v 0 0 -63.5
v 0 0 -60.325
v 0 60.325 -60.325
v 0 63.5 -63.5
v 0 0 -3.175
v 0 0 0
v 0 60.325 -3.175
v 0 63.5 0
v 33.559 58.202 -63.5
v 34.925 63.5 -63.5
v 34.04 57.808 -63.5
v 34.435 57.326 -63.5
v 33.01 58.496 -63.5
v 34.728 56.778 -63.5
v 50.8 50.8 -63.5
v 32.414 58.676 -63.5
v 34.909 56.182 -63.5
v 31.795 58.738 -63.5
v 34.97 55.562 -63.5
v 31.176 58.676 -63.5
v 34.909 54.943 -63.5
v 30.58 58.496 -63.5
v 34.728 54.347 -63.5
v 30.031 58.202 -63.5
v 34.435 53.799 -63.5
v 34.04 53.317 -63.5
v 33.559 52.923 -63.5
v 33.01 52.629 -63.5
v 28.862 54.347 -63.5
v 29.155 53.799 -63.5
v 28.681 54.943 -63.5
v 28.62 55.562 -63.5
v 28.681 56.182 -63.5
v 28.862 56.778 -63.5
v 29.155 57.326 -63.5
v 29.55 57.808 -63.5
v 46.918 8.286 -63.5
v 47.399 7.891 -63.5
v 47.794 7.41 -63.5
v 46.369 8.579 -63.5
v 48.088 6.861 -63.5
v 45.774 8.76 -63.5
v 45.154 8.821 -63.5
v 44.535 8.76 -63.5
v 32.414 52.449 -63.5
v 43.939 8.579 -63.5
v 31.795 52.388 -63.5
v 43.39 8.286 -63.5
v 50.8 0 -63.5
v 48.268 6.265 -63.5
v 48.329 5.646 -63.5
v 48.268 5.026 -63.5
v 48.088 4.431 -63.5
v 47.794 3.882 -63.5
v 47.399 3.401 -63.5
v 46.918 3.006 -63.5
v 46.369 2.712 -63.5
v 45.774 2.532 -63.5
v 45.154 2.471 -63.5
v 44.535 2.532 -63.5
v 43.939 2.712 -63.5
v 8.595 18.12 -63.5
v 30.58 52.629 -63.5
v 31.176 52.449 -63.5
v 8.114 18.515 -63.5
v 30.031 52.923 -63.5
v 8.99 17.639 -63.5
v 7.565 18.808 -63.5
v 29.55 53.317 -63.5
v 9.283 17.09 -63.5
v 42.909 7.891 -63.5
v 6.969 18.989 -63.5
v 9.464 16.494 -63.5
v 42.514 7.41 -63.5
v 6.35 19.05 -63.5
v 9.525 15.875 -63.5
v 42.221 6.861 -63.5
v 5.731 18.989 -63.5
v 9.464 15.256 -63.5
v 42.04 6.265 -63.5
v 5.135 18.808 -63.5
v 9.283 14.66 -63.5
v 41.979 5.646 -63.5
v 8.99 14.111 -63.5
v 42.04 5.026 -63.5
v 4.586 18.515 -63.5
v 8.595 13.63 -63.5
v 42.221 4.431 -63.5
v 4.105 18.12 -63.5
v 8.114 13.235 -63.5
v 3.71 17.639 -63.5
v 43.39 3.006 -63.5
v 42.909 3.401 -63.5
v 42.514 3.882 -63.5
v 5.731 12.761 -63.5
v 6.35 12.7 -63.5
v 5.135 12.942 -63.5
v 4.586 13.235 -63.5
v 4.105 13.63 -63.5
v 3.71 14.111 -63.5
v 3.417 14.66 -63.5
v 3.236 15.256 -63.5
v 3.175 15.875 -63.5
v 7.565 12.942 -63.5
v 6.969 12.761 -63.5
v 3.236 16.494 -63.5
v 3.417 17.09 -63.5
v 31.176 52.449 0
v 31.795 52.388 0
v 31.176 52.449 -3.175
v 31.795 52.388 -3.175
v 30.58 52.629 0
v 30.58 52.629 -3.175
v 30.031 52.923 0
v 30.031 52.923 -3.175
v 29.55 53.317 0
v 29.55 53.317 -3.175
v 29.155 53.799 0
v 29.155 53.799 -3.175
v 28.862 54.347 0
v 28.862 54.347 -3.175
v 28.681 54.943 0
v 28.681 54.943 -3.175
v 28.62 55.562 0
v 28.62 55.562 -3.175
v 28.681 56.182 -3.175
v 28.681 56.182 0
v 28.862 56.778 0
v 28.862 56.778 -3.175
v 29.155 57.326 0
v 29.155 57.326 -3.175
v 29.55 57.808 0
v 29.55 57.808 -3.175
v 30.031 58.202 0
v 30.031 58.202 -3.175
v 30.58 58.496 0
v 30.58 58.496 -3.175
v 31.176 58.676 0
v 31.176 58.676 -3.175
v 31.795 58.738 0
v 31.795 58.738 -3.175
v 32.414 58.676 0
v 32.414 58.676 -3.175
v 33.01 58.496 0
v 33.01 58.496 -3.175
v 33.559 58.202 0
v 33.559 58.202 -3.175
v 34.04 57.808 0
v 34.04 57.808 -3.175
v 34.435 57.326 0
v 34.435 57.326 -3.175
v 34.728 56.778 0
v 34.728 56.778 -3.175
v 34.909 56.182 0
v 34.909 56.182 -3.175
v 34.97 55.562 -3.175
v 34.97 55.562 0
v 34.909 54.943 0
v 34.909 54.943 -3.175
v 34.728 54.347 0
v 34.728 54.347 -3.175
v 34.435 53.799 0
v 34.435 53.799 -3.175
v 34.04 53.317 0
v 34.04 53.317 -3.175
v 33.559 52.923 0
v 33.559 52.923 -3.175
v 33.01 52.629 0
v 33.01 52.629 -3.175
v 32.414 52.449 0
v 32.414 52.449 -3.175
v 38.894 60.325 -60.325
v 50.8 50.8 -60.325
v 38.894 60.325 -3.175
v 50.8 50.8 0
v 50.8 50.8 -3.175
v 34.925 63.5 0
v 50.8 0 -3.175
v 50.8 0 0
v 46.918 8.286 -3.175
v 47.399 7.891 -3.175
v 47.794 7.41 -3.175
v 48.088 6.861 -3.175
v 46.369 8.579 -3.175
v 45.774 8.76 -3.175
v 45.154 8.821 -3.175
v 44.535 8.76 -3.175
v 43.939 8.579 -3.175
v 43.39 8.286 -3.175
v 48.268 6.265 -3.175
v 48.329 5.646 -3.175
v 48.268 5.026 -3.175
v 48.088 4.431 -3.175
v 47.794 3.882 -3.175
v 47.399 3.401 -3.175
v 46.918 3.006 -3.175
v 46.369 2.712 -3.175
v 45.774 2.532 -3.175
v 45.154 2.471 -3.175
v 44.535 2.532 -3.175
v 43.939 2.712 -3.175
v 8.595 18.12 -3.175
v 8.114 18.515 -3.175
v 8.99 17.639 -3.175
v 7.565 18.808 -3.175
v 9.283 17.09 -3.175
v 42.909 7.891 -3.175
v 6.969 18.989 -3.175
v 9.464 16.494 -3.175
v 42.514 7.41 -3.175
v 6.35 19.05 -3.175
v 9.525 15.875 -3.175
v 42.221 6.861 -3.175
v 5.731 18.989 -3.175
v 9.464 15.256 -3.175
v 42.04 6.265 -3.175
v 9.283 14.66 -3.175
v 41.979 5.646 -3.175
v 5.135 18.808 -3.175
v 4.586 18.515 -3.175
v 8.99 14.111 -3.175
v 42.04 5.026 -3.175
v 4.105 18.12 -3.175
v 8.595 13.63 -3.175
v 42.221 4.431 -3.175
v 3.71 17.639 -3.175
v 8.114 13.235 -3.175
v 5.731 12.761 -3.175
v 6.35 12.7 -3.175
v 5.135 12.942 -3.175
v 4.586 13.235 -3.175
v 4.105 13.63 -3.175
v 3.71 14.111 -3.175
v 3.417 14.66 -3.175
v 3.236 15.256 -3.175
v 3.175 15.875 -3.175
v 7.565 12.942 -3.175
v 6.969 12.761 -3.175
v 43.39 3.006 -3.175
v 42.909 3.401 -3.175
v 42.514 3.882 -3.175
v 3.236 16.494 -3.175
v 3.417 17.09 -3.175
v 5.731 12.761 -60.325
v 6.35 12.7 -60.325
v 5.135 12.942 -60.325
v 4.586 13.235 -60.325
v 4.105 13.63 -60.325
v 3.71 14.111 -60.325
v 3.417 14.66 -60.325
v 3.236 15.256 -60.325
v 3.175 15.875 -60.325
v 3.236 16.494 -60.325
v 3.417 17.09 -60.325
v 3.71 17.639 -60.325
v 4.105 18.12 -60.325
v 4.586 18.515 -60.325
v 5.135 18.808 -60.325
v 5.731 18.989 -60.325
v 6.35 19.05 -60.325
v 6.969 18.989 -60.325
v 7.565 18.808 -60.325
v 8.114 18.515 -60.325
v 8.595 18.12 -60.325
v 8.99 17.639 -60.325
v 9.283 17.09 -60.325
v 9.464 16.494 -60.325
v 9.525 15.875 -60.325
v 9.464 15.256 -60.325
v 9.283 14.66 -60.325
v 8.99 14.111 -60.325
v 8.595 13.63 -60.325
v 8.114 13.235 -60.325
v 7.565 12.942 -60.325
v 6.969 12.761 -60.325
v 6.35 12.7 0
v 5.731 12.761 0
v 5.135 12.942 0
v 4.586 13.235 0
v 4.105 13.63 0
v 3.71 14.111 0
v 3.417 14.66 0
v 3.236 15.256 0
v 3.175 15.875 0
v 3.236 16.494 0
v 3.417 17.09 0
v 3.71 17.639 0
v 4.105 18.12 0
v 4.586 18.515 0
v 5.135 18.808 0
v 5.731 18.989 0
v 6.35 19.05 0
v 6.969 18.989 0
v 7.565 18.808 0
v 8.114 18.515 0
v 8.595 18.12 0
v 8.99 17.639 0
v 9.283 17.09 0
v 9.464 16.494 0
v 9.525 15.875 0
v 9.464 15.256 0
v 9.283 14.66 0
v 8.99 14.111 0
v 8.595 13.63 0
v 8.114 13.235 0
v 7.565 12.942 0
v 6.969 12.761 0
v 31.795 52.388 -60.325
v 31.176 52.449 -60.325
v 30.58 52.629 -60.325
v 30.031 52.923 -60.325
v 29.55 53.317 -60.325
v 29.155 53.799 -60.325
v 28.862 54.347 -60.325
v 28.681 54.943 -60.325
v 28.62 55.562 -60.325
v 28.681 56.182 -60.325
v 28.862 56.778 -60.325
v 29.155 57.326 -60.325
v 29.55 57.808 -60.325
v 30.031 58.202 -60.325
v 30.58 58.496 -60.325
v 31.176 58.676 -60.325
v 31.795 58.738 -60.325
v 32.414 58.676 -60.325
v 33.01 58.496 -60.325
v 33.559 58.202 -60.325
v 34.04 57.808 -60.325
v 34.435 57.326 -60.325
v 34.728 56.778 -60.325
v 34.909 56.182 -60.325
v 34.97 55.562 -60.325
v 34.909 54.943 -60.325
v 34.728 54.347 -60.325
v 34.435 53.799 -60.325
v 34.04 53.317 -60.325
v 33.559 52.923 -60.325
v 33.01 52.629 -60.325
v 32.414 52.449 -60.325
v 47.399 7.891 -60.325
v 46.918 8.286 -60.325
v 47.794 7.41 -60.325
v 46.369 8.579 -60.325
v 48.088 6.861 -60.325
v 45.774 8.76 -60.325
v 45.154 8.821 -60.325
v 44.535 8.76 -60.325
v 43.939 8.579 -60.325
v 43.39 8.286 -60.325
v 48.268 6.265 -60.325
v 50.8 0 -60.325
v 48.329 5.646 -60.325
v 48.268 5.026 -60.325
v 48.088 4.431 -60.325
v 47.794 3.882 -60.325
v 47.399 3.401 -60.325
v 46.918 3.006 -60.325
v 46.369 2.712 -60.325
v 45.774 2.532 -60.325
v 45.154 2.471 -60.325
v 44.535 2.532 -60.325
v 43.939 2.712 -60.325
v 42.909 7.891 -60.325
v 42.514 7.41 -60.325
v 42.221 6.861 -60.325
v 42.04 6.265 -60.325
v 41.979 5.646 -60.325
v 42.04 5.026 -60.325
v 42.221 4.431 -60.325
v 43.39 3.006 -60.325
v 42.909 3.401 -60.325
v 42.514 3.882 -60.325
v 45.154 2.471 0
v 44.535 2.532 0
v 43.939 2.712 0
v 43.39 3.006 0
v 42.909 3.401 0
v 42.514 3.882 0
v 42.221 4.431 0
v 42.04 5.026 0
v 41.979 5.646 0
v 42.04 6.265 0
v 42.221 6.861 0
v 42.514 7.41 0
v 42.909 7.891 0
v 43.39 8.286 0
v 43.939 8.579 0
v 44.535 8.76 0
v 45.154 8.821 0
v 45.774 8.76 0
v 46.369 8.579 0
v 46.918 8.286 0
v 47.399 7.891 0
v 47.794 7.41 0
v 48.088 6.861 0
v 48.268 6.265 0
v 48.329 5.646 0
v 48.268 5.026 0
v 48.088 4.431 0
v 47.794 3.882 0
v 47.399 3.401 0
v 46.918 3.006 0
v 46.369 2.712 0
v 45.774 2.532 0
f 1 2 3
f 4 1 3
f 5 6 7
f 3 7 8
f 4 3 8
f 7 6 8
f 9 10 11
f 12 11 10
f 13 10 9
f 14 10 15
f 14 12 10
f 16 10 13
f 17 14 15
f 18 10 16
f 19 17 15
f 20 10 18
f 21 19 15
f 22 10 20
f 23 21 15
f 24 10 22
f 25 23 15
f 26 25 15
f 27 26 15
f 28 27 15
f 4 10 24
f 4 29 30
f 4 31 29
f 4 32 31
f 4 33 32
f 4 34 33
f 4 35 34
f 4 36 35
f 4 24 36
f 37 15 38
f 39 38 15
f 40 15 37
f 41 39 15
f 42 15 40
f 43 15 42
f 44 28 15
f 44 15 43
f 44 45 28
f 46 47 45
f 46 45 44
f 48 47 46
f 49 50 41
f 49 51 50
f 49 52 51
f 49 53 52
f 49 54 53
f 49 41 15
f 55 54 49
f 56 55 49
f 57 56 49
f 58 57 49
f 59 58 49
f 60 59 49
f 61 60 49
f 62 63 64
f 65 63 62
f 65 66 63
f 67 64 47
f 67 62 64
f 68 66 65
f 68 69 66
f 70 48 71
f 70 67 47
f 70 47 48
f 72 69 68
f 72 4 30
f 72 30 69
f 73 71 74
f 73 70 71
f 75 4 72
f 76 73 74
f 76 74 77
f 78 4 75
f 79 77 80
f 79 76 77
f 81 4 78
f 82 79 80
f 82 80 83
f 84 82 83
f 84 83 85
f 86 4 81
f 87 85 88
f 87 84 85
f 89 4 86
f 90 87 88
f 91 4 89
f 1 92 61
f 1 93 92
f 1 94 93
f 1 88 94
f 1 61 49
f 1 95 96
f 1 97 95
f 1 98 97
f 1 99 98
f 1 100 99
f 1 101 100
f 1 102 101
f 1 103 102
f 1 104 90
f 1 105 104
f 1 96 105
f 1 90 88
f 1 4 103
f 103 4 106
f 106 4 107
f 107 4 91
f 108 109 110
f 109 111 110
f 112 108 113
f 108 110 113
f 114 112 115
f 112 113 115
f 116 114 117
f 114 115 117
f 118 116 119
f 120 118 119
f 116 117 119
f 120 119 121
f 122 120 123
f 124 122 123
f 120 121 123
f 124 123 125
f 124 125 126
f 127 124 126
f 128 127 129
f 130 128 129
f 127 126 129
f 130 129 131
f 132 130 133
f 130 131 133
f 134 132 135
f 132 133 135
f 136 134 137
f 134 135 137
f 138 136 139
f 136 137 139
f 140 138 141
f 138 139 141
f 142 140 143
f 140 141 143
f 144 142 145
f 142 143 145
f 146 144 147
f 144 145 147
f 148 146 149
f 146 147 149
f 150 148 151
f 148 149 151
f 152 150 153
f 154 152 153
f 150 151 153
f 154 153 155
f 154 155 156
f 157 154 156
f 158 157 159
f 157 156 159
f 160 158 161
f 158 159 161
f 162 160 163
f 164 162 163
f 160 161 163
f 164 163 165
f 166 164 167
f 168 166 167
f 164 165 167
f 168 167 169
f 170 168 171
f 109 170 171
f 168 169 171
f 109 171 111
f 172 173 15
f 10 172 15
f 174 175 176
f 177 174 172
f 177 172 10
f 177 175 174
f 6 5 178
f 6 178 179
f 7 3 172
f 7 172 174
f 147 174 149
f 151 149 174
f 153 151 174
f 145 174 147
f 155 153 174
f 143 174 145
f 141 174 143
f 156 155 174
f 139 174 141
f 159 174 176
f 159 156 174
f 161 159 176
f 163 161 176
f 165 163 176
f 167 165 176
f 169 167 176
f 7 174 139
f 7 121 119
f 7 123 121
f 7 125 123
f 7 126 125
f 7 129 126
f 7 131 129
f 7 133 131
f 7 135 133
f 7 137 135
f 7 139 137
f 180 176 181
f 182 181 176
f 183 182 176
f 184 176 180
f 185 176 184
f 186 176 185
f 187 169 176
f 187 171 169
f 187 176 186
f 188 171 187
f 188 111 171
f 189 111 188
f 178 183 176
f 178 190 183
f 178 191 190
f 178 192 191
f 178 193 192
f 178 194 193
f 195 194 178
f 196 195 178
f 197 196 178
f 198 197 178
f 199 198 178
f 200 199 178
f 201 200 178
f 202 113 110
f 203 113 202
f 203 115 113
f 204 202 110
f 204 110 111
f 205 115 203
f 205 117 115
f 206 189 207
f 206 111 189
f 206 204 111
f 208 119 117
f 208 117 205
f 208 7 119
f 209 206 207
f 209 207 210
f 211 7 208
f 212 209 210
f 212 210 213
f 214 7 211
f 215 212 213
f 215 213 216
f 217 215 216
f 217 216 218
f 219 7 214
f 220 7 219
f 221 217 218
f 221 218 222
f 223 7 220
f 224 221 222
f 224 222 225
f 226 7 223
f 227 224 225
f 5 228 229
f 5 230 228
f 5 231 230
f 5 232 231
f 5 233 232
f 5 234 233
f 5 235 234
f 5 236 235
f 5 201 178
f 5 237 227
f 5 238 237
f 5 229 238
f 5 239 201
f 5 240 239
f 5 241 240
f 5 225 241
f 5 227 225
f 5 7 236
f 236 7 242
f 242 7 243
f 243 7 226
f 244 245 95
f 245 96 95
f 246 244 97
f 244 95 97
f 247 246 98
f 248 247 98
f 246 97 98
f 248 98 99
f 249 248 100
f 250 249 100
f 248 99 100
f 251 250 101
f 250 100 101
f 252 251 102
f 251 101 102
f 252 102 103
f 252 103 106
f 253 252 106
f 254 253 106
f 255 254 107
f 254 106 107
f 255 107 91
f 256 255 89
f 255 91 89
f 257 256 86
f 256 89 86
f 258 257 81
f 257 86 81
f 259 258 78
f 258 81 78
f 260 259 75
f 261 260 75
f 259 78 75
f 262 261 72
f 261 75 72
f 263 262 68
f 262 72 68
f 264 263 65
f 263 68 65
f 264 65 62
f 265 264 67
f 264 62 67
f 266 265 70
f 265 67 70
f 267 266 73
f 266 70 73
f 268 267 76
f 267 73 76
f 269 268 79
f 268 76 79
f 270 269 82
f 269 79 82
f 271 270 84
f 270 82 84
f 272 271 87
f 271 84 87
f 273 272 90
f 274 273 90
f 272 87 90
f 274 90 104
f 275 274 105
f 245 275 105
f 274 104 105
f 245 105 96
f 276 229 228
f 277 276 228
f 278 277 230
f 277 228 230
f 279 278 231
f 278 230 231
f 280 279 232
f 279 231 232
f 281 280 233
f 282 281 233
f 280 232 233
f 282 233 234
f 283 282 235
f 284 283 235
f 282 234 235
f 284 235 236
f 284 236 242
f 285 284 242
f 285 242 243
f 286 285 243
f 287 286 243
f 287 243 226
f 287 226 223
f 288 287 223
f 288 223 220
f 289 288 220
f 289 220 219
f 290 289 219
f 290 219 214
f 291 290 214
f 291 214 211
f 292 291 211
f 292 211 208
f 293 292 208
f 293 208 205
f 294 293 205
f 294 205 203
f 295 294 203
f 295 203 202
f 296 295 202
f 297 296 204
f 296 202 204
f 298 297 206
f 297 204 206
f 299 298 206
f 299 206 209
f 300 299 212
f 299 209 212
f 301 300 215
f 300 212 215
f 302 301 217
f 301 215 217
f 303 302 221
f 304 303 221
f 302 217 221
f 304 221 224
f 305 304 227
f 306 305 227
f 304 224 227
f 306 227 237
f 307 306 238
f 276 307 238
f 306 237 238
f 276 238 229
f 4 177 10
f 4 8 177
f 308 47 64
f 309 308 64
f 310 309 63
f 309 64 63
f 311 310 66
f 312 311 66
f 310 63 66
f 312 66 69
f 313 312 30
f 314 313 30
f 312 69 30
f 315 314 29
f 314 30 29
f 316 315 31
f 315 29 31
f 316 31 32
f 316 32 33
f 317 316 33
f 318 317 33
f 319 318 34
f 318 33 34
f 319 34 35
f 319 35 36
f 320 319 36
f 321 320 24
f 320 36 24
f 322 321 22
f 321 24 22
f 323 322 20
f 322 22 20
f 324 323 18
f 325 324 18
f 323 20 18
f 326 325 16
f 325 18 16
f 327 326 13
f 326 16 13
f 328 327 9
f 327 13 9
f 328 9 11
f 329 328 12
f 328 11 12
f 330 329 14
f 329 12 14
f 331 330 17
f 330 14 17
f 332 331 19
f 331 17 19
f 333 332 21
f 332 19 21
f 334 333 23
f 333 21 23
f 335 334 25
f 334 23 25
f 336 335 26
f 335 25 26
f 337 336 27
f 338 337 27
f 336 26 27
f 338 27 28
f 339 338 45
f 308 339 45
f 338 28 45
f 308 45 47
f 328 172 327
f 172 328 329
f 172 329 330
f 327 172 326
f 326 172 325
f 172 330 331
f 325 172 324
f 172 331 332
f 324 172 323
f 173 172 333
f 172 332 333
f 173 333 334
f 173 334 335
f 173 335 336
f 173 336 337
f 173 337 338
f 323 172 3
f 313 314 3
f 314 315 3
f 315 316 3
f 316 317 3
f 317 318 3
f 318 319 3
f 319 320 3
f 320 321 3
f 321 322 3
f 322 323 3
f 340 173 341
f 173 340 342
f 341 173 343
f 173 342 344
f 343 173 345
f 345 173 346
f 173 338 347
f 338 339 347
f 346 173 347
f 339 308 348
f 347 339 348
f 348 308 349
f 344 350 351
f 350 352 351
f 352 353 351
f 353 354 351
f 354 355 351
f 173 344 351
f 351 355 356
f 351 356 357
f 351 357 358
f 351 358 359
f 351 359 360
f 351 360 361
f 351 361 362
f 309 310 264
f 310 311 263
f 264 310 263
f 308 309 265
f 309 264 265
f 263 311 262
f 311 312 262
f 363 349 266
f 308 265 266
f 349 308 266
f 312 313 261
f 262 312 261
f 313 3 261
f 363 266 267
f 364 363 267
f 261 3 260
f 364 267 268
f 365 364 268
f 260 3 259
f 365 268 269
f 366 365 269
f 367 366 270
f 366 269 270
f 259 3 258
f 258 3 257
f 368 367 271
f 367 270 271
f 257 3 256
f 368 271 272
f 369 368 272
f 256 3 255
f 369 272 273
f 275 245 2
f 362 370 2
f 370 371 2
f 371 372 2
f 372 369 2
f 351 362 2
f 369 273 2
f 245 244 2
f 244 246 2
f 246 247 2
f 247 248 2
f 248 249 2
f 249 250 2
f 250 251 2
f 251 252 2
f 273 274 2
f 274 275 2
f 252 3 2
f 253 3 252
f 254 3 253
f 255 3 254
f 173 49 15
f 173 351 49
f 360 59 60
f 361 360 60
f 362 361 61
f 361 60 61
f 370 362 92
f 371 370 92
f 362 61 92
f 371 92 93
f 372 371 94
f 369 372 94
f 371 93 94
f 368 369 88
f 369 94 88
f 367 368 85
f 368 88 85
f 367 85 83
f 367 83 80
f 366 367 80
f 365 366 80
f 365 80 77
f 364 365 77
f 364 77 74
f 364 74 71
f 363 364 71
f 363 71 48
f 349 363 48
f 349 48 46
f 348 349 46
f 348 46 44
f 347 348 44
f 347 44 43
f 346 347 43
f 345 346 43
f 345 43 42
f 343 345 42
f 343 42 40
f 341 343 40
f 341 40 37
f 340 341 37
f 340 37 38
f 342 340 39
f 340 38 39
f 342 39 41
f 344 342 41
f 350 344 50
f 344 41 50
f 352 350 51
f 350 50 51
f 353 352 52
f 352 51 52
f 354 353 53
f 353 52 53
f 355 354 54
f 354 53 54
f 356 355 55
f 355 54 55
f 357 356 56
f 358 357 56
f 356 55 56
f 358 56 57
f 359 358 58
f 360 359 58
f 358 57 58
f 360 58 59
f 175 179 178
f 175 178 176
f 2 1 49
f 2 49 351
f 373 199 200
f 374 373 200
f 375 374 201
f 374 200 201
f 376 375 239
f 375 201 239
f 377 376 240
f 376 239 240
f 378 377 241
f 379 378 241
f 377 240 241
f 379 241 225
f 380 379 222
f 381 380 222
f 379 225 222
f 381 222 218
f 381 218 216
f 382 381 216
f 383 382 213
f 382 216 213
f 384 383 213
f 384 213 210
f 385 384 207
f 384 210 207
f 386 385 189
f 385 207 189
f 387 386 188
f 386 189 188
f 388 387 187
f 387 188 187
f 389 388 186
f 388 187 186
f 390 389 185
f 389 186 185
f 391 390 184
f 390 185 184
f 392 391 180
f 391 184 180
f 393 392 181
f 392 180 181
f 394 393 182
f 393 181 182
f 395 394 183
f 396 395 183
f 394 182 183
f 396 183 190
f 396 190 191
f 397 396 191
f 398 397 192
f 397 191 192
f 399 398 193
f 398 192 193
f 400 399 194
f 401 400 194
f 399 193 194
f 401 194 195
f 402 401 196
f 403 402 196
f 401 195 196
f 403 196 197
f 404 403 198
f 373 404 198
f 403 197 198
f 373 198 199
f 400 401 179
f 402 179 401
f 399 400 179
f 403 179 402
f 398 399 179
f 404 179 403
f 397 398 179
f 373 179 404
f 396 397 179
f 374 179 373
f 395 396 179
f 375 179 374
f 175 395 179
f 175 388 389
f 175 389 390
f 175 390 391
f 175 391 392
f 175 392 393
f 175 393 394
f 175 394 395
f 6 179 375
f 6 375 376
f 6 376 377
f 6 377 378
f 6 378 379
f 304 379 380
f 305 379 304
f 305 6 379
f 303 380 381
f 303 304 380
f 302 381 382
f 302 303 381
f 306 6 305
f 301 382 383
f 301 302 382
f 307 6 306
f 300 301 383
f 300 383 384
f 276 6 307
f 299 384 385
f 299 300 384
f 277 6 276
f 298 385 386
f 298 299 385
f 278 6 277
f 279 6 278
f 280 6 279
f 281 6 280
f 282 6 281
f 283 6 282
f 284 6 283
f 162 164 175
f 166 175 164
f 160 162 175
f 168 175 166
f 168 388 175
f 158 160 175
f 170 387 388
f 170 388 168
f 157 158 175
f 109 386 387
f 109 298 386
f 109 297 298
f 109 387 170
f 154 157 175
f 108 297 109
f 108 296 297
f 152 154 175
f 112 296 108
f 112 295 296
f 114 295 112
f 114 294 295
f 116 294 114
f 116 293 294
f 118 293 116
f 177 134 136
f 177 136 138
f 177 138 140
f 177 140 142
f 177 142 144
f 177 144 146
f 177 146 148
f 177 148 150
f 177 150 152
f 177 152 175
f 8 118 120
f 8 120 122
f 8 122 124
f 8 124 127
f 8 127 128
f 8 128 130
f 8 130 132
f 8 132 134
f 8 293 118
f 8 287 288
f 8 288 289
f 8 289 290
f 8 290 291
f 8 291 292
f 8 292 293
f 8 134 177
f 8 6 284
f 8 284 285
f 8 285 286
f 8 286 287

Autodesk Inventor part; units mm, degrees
ref_plane "YZ Plane" through (0, 0, 0) normal (1, 0, 0) x (0, 1, 0)
ref_plane "XZ Plane" through (0, 0, 0) normal (0, 1, 0) x (-1, 0, 0)
ref_plane "XY Plane" through (0, 0, 0) normal (0, 0, 1) x (1, 0, 0)
sketch "Sketch1" plane through (0, 0, 0) normal (1, 0, 0) x (0, 1, 0)
  line L0 (0, 0) -> (63.5, 0)
  line L1 (63.5, 0) -> (63.5, -63.5)
  line L2 (63.5, -63.5) -> (0, -63.5)
  line L3 (60.325, -3.175) -> (3.175, -3.175)
  line L4 (3.175, -60.325) -> (60.325, -60.325)
  line L5 (60.325, -60.325) -> (60.325, -3.175)
  line L6 (3.175, -3.175) -> (-12.9864, -3.175)
  line L7 (3.175, -60.325) -> (-8.5998, -60.325)
  line L8 (0, -63.5) -> (0, -60.325)
  line L9 (0, -3.175) -> (0, 0)
  dimension "d6" = 63.5
  dimension "d7" = 3.175
extrude "Extrusion1" add sketch "Sketch1" along normal blind 50.8
ref_plane "Work Plane1" through (0, 0, -31.75) normal (0, 0, -1) x (-1, 0, 0)
sketch "Sketch2" plane through (0, 0, 0) normal (0, 0, 1) x (1, 0, 0)
  line L0 (0, 0) -> (0, 63.5) projected
  line L1 (0, 63.5) -> (50.8, 63.5) projected
  line L2 (0, 0) -> (50.8, 0) projected
  point P0 (6.35, 15.875)
  dimension "d33" = 15.875
  dimension "d34" = 6.35
hole "Hole1" at (6.35, 15.875, 0) direction (0, 0, -1) diameter 6.35 end through all
sketch "Sketch4" plane through (0, 0, 0) normal (0, 0, 1) x (1, 0, 0)
  line L0 (50.8, 0) -> (50.8, 63.5) projected
  line L1 (50.8, 63.5) -> (34.925, 63.5)
  line L2 (34.925, 63.5) -> (34.925, 57.15)
  line L3 (50.8, 50.8) -> (50.8, 63.5)
  line L4 (50.8, 50.8) -> (34.925, 63.5)
  point P0 (0, 0)
  dimension "d58" = 15.875
  dimension "d60" = 12.7
extrude "Extrusion2" cut sketch "Sketch4" against normal through all
sketch "Sketch3" plane through (0, 0, 0) normal (0, 0, 1) x (1, 0, 0)
  circle A0 centre (6.35, 15.875) radius 3.175 construction
  line L0 (0, 0) -> (0, 63.5) construction
  line L1 (0, 0) -> (50.8, 0) construction
  line L2 (50.8, 50.8) -> (50.8, 0) construction
  line L3 (0, 63.5) -> (34.925, 63.5) construction
  line L4 (9.8817, -6.9679) -> (-8.7166, 33.4041) construction
  line L5 (-8.7166, 33.4041) -> (298.3815, 174.8763) construction
  line L6 (298.3815, 174.8763) -> (316.9799, 134.5042) construction
  line L7 (316.9799, 134.5042) -> (9.8817, -6.9679) construction
  line L8 (0, 60.325) -> (50.8, 60.325) construction
  line L9 (50.8, 50.8) -> (34.925, 63.5) projected
  point P0 (45.1543, 5.6457)
  point P1 (31.795, 55.5625)
  point P2 (288.925, 146.05)
  dimension "d36" = 6.35
  dimension "d38" = 5.6457
  dimension "d41" = 44.45
  dimension "d43" = 3.302
  dimension "d44" = 3.175
  dimension "d46" = 22.225
  dimension "d49" = 22.225
  dimension "d50" = 20.6502
  dimension "d52" = 130.175
  dimension "d53" = 4.7625
  dimension "d54" = 282.575
  dimension "d55" = 24.734
  dimension "d56" = 338.1178
  dimension "d57" = 5.6457
hole "Hole2" at (45.1543, 5.6457, 0) at (31.795, 55.5625, 0) direction (0, 0, -1) diameter 6.35 end through all
equation "\"d57\" = d38"
properties part number "CAR_024_KickerUChannel" material "Aluminum 6061"
